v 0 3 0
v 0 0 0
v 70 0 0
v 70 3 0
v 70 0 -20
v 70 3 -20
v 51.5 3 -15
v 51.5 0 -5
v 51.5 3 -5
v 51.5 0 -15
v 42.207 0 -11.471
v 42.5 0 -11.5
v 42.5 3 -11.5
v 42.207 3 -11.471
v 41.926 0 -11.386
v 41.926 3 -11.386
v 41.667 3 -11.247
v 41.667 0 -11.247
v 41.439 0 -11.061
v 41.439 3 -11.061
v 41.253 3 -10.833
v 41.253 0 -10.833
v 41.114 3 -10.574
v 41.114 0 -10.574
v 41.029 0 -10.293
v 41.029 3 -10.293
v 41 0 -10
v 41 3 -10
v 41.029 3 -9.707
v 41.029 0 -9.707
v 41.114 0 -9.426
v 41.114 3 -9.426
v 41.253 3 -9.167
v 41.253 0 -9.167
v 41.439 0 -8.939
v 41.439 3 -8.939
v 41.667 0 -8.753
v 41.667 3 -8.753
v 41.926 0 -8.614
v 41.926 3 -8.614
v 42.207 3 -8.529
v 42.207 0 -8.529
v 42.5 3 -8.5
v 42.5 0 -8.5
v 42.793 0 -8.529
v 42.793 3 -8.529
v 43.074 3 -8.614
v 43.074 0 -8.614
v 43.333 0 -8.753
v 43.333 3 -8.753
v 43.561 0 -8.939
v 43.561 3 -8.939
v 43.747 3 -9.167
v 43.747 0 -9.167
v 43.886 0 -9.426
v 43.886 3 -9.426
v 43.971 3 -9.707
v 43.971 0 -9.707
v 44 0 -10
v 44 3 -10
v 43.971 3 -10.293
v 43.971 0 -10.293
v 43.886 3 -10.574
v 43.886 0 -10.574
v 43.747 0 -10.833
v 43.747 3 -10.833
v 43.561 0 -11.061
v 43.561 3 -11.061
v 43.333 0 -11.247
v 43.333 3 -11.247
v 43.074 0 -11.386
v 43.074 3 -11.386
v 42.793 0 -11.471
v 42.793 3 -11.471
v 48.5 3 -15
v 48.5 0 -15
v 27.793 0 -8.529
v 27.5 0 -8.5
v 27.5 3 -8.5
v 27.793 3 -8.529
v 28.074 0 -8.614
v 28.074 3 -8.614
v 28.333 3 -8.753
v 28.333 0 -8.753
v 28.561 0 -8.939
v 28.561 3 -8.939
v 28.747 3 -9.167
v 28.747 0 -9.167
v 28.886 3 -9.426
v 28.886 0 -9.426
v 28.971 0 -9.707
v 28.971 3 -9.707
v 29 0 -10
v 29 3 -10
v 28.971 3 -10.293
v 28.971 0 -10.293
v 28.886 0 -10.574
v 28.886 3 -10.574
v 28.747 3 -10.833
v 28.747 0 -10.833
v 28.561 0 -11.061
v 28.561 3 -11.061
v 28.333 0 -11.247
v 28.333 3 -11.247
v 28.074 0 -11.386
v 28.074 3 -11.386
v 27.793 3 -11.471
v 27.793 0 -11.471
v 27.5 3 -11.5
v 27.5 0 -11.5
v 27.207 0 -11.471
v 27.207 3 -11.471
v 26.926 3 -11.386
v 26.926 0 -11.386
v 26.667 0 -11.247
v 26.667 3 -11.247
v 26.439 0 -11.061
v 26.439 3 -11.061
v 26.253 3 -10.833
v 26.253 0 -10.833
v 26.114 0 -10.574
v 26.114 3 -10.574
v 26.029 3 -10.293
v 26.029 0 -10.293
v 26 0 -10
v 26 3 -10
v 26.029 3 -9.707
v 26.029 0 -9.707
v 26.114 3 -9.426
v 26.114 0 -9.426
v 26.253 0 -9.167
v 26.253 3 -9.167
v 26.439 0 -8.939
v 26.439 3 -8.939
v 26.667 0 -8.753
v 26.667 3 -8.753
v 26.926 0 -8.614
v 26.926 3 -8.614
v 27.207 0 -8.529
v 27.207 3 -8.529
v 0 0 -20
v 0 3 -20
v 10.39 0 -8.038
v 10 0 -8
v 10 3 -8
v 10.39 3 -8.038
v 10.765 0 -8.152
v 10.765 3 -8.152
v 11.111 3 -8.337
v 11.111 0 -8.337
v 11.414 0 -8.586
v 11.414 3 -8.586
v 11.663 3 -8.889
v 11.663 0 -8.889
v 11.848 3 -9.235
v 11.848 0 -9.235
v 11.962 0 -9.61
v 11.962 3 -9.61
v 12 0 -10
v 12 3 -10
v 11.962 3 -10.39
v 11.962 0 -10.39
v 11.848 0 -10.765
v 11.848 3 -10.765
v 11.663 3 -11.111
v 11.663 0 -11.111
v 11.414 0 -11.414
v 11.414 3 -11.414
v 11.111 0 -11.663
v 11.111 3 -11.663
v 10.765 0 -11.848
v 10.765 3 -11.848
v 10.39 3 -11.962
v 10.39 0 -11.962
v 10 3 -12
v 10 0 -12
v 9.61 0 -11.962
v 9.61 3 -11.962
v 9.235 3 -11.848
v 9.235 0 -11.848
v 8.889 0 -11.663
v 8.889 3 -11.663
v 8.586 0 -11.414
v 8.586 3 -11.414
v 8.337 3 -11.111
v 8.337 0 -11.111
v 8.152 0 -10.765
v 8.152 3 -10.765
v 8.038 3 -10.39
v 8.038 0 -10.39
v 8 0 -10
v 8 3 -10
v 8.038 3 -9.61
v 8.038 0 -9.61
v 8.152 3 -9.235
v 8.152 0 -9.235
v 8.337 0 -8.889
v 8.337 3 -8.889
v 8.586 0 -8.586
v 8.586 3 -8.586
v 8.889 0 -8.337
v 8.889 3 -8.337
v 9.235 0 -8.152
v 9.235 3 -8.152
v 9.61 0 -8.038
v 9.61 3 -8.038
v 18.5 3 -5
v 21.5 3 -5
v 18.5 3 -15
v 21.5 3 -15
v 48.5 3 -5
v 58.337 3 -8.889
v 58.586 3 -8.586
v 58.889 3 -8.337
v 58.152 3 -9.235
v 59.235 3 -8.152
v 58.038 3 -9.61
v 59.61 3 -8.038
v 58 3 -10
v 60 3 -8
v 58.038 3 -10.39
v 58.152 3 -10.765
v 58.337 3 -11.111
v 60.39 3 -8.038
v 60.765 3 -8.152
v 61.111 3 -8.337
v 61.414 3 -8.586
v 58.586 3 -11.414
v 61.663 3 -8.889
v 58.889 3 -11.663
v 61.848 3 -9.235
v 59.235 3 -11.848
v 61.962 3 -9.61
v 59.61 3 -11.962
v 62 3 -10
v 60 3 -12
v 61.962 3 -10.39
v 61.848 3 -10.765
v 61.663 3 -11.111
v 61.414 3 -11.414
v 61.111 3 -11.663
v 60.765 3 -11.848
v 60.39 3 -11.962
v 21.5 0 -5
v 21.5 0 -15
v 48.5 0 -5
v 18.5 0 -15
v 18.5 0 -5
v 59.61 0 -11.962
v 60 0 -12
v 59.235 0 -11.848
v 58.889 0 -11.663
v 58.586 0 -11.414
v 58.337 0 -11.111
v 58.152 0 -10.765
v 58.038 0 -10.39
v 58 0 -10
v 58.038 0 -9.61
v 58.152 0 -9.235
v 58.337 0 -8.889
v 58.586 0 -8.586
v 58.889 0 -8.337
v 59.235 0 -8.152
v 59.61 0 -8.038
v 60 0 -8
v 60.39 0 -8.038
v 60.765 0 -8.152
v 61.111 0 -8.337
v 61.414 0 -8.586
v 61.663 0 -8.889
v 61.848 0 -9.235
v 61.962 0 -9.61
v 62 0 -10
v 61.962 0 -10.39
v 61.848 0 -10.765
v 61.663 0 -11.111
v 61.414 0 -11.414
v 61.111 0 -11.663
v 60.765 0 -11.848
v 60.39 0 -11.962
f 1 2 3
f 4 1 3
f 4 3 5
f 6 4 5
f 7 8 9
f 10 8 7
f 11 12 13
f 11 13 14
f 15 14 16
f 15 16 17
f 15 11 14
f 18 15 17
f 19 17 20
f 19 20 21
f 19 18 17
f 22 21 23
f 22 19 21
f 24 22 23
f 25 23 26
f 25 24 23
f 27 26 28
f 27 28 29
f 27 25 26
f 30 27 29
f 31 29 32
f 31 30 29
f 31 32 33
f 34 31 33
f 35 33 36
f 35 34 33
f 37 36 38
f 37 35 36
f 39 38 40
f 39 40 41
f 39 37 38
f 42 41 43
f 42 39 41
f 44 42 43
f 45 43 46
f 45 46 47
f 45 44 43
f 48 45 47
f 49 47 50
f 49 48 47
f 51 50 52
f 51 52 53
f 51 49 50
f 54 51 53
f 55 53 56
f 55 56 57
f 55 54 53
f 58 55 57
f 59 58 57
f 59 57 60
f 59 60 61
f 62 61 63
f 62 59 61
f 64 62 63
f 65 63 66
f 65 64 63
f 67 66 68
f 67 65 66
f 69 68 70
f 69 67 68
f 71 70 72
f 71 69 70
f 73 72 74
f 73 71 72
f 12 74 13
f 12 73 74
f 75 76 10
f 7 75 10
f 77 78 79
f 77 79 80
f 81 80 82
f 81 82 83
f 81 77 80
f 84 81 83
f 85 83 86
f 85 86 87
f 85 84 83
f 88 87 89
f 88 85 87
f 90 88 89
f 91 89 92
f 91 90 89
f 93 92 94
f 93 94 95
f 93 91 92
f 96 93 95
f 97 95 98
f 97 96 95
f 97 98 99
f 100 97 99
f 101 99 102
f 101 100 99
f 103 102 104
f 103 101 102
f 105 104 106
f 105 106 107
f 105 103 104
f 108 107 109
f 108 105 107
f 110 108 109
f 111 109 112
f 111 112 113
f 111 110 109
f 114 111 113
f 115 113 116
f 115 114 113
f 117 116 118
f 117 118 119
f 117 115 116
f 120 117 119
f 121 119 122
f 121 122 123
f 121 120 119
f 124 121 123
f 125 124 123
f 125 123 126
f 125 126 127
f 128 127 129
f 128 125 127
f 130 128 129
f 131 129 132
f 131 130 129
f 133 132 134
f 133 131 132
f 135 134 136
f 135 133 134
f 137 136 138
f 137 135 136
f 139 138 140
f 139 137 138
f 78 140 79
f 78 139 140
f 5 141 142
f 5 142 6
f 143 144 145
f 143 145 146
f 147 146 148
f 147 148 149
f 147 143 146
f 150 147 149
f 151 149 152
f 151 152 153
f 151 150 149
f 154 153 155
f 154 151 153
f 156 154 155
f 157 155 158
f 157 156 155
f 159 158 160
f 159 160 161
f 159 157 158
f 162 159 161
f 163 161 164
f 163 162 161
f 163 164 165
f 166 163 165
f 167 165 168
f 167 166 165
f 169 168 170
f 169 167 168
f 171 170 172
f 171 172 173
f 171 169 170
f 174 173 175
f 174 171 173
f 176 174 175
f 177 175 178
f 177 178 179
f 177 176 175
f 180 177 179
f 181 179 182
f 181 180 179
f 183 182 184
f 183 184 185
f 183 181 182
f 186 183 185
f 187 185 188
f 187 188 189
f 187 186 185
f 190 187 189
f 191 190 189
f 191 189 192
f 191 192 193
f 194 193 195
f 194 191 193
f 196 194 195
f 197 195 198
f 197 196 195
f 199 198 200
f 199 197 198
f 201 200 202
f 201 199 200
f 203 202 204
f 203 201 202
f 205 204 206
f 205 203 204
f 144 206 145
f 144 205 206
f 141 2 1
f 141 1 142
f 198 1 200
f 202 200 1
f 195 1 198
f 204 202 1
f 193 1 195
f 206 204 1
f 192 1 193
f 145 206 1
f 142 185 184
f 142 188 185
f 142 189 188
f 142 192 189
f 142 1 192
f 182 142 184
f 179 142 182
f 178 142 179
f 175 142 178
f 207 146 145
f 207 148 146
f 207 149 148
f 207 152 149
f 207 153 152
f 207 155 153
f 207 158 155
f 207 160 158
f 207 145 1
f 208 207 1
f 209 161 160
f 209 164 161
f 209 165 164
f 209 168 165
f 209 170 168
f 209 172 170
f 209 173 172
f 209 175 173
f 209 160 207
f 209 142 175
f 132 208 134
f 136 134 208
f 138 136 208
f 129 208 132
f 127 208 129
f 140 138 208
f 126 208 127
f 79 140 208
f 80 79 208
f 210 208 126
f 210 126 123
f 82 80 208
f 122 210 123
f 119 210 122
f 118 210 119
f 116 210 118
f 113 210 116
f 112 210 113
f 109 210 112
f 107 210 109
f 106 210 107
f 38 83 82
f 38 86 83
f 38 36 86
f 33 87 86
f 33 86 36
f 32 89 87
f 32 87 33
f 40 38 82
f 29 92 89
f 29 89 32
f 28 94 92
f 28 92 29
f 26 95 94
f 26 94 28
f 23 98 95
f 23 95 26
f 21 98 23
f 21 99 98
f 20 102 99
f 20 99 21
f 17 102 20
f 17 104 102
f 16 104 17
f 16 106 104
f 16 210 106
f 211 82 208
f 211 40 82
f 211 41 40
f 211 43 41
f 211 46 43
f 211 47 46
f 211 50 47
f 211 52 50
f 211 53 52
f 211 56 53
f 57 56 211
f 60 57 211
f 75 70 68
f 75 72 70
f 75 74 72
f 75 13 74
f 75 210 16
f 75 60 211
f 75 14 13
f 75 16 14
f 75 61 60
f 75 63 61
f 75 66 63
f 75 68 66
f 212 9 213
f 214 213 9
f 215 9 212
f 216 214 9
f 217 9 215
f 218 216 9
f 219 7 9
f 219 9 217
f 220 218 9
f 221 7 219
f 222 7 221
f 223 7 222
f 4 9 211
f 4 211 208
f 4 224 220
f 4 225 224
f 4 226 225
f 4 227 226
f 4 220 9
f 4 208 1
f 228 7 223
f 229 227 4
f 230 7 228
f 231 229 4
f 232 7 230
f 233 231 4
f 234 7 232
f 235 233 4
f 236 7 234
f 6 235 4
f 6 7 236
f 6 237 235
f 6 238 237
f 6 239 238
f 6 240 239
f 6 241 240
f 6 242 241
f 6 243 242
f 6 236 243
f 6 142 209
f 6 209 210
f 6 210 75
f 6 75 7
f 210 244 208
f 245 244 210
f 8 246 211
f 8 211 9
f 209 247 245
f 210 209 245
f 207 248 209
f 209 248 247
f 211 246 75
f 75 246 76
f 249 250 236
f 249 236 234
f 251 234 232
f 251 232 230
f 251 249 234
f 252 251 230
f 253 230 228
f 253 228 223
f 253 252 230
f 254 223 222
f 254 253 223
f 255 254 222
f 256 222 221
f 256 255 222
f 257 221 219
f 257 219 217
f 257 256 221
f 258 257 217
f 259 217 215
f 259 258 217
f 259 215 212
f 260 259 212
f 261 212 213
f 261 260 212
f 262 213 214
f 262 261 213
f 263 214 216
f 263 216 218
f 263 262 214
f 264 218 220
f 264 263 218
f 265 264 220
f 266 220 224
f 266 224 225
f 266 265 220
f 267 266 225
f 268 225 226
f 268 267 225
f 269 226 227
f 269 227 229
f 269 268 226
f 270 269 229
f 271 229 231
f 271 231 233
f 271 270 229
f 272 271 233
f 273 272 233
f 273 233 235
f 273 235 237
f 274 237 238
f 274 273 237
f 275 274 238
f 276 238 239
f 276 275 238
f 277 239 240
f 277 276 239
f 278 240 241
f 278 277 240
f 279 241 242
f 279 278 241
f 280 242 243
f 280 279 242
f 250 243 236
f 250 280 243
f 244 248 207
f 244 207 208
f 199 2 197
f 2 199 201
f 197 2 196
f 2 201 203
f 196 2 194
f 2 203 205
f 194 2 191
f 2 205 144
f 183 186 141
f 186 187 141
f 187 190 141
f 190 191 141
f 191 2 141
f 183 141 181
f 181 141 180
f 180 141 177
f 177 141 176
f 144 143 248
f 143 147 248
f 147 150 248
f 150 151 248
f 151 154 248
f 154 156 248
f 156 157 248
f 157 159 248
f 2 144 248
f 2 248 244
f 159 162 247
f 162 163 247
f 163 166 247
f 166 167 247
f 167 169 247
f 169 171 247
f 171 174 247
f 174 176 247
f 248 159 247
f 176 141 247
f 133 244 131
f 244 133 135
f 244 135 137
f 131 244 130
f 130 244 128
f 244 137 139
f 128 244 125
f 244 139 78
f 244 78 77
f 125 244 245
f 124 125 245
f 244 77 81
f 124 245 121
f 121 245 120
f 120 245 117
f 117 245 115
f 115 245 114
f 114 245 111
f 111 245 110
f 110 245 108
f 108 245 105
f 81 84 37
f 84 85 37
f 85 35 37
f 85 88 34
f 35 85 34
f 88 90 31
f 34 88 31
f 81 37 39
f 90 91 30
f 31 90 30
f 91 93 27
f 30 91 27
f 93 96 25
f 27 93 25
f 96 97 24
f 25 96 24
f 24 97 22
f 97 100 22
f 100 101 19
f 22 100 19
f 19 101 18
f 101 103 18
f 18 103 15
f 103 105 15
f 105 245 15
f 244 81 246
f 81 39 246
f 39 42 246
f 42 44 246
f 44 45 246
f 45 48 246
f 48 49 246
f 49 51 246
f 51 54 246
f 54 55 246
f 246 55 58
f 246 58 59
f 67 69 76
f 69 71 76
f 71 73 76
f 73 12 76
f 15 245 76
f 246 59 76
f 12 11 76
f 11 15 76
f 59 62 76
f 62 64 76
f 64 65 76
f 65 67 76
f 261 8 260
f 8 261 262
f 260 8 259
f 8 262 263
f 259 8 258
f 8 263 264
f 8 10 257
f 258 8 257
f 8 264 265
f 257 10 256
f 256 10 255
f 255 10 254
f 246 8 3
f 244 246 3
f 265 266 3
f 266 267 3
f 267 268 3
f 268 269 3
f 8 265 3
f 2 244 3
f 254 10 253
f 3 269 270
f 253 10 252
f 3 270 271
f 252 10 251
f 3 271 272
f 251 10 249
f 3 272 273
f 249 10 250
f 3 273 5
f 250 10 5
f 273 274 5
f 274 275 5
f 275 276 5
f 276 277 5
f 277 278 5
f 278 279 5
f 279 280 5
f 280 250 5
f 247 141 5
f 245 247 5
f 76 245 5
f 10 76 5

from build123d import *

# Parameters (mm, degrees)
SKETCH1_W           = 70
SKETCH1_H           = 20
SKETCH1_R           = 2
SKETCH1_R_2         = 1.5
SKETCH1_W_2         = 3
SKETCH1_H_2         = 10
BOSS_EXTRUDE1_DEPTH = 3


with BuildPart() as part:
    # Sketch1 → Boss-Extrude1 (new body)
    with BuildSketch(Plane(origin=(0, 0, 0), x_dir=(1, 0, 0), z_dir=(0, 1, 0))):
        with Locations((35, 10)):
            Rectangle(SKETCH1_W, SKETCH1_H)
        with Locations(Location((10, 10, 0), (0, 0, 270))):
            Circle(SKETCH1_R, mode=Mode.SUBTRACT)
        with Locations(Location((27.5, 10, 0), (0, 0, 270))):
            Circle(SKETCH1_R_2, mode=Mode.SUBTRACT)
        with Locations(Location((60, 10, 0), (0, 0, 90))):
            Circle(SKETCH1_R, mode=Mode.SUBTRACT)
        with Locations(Location((42.5, 10, 0), (0, 0, 90))):
            Circle(SKETCH1_R_2, mode=Mode.SUBTRACT)
        with Locations((20, 10)):
            Rectangle(SKETCH1_W_2, SKETCH1_H_2, mode=Mode.SUBTRACT)
        with Locations((50, 10)):
            Rectangle(SKETCH1_W_2, SKETCH1_H_2, mode=Mode.SUBTRACT)
    extrude(amount=BOSS_EXTRUDE1_DEPTH)


solid = part.part
